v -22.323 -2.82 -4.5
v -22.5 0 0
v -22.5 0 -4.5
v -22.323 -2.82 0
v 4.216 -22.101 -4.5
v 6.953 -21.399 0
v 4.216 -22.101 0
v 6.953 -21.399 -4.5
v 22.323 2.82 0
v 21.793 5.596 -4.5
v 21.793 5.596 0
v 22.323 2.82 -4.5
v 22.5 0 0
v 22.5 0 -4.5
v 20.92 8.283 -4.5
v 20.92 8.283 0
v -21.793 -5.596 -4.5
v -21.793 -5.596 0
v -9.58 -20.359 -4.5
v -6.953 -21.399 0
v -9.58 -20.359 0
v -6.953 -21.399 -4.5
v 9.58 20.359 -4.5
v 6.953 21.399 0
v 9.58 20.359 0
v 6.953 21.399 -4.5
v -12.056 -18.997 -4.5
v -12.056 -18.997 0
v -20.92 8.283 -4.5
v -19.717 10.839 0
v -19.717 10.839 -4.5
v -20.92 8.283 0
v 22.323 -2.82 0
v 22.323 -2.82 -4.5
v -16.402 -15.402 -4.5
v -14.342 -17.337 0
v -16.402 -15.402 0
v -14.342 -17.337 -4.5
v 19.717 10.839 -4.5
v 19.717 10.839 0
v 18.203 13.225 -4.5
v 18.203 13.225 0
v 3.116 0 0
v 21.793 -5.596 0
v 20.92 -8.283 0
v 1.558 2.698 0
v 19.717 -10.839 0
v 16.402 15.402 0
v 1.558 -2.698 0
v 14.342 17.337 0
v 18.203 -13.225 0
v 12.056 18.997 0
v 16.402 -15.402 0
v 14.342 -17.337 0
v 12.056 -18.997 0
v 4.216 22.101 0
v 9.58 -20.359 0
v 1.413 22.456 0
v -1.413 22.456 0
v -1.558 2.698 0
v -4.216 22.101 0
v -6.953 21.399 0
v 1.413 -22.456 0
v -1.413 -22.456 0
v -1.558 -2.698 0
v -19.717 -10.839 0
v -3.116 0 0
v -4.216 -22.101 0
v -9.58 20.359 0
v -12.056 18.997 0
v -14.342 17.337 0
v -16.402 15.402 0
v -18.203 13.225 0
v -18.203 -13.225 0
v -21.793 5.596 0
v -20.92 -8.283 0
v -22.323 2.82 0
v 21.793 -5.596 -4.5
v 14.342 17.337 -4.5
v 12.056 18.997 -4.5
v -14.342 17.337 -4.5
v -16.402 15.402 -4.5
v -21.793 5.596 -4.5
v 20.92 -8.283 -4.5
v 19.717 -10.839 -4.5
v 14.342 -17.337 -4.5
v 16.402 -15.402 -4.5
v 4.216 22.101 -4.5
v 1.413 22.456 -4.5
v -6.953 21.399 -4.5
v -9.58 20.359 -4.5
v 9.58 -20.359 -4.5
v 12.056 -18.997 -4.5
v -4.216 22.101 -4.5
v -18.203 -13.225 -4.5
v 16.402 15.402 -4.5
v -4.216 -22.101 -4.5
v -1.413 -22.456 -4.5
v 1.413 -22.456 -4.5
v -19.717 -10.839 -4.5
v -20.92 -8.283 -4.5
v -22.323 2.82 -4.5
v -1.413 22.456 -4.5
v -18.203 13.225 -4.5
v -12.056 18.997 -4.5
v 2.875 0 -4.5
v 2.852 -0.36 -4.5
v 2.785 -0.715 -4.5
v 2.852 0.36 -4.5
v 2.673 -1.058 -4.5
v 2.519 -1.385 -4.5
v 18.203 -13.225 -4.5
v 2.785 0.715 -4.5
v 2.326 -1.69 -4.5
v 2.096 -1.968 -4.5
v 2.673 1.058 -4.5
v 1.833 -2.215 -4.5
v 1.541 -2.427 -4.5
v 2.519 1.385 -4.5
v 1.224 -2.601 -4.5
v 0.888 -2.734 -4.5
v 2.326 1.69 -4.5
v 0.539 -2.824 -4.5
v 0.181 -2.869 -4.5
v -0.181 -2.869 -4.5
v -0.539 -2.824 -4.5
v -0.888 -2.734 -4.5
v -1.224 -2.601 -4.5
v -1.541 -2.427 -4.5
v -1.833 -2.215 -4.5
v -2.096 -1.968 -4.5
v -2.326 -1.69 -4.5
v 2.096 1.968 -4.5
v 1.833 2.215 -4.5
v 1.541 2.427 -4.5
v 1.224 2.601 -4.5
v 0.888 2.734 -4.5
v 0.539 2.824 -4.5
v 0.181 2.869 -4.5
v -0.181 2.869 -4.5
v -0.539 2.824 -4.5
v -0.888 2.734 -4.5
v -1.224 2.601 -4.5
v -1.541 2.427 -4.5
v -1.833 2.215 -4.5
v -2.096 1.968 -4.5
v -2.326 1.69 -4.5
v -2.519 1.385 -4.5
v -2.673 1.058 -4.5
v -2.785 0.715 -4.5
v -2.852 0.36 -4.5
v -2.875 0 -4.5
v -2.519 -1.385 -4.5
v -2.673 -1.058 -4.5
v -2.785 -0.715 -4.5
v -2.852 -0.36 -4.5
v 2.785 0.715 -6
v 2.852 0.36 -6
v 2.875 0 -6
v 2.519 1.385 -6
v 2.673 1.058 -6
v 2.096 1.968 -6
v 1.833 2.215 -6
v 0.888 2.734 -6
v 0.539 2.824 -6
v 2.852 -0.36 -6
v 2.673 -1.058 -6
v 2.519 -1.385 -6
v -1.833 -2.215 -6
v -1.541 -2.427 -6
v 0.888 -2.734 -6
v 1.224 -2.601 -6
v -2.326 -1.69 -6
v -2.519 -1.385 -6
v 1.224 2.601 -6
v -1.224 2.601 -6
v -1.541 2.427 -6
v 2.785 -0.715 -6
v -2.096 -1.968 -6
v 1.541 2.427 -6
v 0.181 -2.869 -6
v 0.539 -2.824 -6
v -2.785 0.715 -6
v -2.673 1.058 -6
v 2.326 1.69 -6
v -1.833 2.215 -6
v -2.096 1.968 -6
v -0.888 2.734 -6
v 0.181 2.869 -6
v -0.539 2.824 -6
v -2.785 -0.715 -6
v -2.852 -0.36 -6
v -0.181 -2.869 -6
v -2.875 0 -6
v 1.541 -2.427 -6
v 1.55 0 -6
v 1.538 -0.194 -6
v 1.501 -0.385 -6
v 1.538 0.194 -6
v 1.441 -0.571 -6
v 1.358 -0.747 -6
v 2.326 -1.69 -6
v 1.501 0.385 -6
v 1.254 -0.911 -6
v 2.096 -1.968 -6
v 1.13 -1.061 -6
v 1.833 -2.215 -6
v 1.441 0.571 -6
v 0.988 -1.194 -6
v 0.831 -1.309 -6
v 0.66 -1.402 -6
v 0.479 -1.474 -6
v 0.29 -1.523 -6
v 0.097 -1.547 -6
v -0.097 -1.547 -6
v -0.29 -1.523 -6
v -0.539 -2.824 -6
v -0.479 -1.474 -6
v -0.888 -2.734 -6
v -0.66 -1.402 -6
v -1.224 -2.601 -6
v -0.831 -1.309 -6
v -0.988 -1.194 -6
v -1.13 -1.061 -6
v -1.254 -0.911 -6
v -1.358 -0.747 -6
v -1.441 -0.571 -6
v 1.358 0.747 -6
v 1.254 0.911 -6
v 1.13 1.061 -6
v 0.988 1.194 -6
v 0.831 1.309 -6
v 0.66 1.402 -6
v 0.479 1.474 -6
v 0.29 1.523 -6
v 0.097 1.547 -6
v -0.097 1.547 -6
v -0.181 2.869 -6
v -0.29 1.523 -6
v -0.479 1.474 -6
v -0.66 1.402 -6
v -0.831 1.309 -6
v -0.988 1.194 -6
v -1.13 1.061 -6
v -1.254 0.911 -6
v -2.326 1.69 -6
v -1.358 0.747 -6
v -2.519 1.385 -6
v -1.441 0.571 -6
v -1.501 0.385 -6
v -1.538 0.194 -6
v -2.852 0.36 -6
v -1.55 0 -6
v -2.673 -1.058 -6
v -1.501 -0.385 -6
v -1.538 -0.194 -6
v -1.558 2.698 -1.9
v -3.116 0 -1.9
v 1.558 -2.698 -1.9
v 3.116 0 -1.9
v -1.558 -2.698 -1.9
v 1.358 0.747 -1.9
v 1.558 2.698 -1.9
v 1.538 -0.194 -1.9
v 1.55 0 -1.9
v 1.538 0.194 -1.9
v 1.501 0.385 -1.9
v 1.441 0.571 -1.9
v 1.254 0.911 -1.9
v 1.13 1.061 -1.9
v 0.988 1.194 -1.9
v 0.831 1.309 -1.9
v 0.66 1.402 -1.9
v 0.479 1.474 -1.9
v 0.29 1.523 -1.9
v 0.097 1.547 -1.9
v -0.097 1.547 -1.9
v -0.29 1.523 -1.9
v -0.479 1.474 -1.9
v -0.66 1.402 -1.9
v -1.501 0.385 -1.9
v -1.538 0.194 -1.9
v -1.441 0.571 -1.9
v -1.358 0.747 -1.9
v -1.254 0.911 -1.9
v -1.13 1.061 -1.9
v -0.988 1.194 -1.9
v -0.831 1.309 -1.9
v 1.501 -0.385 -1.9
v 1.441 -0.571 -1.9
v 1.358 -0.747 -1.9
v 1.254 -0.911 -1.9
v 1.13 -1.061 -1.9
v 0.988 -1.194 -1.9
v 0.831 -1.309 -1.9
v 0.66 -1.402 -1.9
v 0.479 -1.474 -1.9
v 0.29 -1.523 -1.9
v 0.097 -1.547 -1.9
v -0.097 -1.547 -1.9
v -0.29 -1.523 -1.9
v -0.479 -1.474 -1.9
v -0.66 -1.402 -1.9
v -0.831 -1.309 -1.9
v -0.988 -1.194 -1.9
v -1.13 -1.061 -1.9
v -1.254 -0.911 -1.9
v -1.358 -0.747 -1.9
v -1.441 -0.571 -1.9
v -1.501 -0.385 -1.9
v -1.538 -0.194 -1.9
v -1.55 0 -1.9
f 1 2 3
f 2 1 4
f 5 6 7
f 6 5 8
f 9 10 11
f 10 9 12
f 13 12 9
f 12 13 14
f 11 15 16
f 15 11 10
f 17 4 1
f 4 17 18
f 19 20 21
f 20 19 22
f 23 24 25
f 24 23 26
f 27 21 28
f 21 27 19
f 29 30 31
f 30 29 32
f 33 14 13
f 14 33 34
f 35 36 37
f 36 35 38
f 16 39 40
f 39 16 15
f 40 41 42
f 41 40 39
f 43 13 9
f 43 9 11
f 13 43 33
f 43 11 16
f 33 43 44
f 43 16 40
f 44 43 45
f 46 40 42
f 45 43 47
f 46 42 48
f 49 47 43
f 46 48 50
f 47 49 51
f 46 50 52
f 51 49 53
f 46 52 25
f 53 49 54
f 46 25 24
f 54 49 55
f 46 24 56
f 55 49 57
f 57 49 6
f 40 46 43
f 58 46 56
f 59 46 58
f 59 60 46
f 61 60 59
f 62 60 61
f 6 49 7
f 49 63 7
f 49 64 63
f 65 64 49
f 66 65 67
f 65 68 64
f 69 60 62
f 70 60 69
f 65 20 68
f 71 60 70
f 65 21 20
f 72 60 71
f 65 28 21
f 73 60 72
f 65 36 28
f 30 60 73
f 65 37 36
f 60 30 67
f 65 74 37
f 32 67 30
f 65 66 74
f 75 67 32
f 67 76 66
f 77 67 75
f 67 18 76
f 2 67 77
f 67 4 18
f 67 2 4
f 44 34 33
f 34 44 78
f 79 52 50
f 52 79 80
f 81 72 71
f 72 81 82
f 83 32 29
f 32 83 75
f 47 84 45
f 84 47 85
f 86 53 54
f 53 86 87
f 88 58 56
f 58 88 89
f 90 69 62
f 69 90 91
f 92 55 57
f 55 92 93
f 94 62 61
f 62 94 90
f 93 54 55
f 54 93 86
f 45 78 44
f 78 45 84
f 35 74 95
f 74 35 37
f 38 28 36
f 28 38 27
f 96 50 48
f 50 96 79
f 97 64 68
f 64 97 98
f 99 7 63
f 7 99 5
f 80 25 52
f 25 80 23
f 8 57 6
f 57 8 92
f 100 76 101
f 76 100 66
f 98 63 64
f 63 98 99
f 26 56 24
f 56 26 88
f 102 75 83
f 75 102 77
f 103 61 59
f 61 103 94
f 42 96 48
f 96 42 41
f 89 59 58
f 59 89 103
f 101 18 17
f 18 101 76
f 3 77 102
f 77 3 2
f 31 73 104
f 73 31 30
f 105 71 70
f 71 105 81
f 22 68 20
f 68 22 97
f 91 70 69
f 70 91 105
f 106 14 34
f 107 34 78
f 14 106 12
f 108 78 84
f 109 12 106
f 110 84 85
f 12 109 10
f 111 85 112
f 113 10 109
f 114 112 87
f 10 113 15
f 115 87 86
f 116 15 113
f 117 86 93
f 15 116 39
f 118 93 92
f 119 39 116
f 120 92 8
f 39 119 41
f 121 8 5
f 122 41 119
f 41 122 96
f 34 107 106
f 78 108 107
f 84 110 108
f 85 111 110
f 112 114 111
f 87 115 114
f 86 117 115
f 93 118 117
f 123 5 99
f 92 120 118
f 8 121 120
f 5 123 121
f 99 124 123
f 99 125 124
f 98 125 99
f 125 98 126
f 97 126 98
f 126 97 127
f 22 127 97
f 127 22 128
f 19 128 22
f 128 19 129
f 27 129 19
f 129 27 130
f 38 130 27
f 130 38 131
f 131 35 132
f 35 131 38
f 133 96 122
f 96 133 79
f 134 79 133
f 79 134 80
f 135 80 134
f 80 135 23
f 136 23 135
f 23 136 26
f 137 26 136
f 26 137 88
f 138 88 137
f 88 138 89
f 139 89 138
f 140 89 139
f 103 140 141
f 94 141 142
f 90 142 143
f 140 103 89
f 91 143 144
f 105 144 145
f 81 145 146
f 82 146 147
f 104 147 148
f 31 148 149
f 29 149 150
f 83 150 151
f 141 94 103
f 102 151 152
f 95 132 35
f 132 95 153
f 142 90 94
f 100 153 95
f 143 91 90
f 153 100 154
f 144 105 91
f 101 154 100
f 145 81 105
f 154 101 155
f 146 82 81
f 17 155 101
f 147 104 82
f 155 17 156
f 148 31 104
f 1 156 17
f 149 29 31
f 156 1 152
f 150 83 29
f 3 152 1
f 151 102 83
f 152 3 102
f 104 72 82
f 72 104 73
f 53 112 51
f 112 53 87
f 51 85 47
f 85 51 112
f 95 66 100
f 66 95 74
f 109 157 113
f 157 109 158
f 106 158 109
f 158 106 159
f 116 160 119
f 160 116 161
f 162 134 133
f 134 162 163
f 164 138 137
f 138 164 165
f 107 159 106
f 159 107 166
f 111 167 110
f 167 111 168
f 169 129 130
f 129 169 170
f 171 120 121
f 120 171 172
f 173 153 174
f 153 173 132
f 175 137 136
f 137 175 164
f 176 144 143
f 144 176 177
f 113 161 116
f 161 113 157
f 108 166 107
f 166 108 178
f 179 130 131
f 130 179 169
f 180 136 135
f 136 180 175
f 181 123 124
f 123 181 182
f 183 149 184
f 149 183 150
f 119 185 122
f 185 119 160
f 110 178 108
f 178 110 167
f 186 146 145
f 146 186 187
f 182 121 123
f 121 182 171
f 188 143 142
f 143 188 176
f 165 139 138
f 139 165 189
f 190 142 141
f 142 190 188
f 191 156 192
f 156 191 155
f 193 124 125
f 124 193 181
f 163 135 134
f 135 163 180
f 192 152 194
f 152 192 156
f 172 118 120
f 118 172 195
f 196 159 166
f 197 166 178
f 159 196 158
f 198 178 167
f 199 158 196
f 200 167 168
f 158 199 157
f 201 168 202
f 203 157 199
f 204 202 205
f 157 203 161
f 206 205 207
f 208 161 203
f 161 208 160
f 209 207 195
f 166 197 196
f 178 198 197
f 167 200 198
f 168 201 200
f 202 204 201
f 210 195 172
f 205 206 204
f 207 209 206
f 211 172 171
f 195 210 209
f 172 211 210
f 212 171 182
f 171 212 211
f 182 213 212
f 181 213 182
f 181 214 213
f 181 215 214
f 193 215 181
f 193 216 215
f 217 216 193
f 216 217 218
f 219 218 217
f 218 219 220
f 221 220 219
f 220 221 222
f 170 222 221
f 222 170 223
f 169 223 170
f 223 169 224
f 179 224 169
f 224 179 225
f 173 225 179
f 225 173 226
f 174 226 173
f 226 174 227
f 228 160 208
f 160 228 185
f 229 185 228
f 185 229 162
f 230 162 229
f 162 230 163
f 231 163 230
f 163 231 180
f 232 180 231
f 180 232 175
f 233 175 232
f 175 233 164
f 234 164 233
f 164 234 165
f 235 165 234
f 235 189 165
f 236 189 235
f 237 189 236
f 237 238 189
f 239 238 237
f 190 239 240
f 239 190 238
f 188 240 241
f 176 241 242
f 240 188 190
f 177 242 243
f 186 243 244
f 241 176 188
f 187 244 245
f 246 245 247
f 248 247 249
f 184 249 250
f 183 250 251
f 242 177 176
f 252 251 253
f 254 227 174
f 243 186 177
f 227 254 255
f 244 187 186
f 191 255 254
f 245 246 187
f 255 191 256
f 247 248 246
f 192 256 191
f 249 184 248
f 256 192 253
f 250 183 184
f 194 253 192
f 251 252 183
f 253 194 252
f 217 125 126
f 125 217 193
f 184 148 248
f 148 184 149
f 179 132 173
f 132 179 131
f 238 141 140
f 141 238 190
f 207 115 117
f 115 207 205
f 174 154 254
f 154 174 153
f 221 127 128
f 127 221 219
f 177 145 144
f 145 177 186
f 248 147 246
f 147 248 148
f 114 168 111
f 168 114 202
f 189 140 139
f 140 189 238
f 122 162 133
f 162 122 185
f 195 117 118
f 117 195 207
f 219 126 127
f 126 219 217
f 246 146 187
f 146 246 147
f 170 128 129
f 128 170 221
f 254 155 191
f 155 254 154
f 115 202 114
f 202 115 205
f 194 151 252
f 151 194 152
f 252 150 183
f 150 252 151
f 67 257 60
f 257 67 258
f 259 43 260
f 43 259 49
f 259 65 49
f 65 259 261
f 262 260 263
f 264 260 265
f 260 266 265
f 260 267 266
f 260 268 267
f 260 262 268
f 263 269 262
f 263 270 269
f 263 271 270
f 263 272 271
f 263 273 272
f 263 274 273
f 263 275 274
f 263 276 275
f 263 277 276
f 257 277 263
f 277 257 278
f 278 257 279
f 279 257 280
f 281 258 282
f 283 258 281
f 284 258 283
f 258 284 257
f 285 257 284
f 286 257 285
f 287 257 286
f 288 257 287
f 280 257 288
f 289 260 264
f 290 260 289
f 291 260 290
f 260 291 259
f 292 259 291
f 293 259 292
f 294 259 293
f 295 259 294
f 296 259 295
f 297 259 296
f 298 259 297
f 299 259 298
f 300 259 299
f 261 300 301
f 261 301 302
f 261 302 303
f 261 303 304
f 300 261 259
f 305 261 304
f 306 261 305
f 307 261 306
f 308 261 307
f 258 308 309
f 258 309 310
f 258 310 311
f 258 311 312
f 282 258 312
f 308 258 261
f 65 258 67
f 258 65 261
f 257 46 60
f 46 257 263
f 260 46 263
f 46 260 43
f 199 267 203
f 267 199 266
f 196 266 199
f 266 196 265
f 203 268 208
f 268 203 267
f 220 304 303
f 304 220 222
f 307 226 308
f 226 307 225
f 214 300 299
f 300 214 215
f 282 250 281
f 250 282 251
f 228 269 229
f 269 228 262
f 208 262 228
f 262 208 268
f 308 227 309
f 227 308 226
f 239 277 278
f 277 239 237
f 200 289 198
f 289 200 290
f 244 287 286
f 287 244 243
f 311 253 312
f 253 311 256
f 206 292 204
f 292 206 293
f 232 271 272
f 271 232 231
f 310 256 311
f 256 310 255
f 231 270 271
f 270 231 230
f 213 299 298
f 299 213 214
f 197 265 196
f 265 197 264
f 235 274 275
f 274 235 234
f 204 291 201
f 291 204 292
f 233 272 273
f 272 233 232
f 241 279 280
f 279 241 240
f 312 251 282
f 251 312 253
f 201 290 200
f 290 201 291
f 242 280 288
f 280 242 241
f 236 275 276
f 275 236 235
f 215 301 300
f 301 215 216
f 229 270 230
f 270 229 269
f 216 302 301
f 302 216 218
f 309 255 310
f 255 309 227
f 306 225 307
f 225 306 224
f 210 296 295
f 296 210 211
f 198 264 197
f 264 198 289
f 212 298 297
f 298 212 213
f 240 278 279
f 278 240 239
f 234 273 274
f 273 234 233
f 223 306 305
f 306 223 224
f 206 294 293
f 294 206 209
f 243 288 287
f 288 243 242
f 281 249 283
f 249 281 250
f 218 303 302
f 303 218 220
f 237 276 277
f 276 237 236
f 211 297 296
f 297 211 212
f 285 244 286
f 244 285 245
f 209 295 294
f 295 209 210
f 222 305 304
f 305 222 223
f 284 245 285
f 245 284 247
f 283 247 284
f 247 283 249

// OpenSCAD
$fn = 50;


difference() {
	union() {
		translate(v = [0, 0, -4.5000000000]) {
			cylinder(h = 4.5000000000, r = 22.5000000000);
		}
		#translate(v = [0, 0, -6.0000000000]) {
			cylinder(h = 6, r = 2.8750000000);
		}
	}
	union() {
		translate(v = [0, 0, 0]) {
			rotate(a = [0, 0, 0]) {
				difference() {
					union() {
						translate(v = [0, 0, -1.9000000000]) {
							linear_extrude(height = 1.9000000000) {
								polygon(points = [[3.1158000000, 0.0000000000], [1.5579000000, 2.6983619531], [-1.5579000000, 2.6983619531], [-3.1158000000, 0.0000000000], [-1.5579000000, -2.6983619531], [1.5579000000, -2.6983619531]]);
							}
						}
					}
					union();
				}
			}
		}
		#translate(v = [0, 0, -100.0000000000]) {
			cylinder(h = 200, r = 1.5500000000);
		}
	}
}
